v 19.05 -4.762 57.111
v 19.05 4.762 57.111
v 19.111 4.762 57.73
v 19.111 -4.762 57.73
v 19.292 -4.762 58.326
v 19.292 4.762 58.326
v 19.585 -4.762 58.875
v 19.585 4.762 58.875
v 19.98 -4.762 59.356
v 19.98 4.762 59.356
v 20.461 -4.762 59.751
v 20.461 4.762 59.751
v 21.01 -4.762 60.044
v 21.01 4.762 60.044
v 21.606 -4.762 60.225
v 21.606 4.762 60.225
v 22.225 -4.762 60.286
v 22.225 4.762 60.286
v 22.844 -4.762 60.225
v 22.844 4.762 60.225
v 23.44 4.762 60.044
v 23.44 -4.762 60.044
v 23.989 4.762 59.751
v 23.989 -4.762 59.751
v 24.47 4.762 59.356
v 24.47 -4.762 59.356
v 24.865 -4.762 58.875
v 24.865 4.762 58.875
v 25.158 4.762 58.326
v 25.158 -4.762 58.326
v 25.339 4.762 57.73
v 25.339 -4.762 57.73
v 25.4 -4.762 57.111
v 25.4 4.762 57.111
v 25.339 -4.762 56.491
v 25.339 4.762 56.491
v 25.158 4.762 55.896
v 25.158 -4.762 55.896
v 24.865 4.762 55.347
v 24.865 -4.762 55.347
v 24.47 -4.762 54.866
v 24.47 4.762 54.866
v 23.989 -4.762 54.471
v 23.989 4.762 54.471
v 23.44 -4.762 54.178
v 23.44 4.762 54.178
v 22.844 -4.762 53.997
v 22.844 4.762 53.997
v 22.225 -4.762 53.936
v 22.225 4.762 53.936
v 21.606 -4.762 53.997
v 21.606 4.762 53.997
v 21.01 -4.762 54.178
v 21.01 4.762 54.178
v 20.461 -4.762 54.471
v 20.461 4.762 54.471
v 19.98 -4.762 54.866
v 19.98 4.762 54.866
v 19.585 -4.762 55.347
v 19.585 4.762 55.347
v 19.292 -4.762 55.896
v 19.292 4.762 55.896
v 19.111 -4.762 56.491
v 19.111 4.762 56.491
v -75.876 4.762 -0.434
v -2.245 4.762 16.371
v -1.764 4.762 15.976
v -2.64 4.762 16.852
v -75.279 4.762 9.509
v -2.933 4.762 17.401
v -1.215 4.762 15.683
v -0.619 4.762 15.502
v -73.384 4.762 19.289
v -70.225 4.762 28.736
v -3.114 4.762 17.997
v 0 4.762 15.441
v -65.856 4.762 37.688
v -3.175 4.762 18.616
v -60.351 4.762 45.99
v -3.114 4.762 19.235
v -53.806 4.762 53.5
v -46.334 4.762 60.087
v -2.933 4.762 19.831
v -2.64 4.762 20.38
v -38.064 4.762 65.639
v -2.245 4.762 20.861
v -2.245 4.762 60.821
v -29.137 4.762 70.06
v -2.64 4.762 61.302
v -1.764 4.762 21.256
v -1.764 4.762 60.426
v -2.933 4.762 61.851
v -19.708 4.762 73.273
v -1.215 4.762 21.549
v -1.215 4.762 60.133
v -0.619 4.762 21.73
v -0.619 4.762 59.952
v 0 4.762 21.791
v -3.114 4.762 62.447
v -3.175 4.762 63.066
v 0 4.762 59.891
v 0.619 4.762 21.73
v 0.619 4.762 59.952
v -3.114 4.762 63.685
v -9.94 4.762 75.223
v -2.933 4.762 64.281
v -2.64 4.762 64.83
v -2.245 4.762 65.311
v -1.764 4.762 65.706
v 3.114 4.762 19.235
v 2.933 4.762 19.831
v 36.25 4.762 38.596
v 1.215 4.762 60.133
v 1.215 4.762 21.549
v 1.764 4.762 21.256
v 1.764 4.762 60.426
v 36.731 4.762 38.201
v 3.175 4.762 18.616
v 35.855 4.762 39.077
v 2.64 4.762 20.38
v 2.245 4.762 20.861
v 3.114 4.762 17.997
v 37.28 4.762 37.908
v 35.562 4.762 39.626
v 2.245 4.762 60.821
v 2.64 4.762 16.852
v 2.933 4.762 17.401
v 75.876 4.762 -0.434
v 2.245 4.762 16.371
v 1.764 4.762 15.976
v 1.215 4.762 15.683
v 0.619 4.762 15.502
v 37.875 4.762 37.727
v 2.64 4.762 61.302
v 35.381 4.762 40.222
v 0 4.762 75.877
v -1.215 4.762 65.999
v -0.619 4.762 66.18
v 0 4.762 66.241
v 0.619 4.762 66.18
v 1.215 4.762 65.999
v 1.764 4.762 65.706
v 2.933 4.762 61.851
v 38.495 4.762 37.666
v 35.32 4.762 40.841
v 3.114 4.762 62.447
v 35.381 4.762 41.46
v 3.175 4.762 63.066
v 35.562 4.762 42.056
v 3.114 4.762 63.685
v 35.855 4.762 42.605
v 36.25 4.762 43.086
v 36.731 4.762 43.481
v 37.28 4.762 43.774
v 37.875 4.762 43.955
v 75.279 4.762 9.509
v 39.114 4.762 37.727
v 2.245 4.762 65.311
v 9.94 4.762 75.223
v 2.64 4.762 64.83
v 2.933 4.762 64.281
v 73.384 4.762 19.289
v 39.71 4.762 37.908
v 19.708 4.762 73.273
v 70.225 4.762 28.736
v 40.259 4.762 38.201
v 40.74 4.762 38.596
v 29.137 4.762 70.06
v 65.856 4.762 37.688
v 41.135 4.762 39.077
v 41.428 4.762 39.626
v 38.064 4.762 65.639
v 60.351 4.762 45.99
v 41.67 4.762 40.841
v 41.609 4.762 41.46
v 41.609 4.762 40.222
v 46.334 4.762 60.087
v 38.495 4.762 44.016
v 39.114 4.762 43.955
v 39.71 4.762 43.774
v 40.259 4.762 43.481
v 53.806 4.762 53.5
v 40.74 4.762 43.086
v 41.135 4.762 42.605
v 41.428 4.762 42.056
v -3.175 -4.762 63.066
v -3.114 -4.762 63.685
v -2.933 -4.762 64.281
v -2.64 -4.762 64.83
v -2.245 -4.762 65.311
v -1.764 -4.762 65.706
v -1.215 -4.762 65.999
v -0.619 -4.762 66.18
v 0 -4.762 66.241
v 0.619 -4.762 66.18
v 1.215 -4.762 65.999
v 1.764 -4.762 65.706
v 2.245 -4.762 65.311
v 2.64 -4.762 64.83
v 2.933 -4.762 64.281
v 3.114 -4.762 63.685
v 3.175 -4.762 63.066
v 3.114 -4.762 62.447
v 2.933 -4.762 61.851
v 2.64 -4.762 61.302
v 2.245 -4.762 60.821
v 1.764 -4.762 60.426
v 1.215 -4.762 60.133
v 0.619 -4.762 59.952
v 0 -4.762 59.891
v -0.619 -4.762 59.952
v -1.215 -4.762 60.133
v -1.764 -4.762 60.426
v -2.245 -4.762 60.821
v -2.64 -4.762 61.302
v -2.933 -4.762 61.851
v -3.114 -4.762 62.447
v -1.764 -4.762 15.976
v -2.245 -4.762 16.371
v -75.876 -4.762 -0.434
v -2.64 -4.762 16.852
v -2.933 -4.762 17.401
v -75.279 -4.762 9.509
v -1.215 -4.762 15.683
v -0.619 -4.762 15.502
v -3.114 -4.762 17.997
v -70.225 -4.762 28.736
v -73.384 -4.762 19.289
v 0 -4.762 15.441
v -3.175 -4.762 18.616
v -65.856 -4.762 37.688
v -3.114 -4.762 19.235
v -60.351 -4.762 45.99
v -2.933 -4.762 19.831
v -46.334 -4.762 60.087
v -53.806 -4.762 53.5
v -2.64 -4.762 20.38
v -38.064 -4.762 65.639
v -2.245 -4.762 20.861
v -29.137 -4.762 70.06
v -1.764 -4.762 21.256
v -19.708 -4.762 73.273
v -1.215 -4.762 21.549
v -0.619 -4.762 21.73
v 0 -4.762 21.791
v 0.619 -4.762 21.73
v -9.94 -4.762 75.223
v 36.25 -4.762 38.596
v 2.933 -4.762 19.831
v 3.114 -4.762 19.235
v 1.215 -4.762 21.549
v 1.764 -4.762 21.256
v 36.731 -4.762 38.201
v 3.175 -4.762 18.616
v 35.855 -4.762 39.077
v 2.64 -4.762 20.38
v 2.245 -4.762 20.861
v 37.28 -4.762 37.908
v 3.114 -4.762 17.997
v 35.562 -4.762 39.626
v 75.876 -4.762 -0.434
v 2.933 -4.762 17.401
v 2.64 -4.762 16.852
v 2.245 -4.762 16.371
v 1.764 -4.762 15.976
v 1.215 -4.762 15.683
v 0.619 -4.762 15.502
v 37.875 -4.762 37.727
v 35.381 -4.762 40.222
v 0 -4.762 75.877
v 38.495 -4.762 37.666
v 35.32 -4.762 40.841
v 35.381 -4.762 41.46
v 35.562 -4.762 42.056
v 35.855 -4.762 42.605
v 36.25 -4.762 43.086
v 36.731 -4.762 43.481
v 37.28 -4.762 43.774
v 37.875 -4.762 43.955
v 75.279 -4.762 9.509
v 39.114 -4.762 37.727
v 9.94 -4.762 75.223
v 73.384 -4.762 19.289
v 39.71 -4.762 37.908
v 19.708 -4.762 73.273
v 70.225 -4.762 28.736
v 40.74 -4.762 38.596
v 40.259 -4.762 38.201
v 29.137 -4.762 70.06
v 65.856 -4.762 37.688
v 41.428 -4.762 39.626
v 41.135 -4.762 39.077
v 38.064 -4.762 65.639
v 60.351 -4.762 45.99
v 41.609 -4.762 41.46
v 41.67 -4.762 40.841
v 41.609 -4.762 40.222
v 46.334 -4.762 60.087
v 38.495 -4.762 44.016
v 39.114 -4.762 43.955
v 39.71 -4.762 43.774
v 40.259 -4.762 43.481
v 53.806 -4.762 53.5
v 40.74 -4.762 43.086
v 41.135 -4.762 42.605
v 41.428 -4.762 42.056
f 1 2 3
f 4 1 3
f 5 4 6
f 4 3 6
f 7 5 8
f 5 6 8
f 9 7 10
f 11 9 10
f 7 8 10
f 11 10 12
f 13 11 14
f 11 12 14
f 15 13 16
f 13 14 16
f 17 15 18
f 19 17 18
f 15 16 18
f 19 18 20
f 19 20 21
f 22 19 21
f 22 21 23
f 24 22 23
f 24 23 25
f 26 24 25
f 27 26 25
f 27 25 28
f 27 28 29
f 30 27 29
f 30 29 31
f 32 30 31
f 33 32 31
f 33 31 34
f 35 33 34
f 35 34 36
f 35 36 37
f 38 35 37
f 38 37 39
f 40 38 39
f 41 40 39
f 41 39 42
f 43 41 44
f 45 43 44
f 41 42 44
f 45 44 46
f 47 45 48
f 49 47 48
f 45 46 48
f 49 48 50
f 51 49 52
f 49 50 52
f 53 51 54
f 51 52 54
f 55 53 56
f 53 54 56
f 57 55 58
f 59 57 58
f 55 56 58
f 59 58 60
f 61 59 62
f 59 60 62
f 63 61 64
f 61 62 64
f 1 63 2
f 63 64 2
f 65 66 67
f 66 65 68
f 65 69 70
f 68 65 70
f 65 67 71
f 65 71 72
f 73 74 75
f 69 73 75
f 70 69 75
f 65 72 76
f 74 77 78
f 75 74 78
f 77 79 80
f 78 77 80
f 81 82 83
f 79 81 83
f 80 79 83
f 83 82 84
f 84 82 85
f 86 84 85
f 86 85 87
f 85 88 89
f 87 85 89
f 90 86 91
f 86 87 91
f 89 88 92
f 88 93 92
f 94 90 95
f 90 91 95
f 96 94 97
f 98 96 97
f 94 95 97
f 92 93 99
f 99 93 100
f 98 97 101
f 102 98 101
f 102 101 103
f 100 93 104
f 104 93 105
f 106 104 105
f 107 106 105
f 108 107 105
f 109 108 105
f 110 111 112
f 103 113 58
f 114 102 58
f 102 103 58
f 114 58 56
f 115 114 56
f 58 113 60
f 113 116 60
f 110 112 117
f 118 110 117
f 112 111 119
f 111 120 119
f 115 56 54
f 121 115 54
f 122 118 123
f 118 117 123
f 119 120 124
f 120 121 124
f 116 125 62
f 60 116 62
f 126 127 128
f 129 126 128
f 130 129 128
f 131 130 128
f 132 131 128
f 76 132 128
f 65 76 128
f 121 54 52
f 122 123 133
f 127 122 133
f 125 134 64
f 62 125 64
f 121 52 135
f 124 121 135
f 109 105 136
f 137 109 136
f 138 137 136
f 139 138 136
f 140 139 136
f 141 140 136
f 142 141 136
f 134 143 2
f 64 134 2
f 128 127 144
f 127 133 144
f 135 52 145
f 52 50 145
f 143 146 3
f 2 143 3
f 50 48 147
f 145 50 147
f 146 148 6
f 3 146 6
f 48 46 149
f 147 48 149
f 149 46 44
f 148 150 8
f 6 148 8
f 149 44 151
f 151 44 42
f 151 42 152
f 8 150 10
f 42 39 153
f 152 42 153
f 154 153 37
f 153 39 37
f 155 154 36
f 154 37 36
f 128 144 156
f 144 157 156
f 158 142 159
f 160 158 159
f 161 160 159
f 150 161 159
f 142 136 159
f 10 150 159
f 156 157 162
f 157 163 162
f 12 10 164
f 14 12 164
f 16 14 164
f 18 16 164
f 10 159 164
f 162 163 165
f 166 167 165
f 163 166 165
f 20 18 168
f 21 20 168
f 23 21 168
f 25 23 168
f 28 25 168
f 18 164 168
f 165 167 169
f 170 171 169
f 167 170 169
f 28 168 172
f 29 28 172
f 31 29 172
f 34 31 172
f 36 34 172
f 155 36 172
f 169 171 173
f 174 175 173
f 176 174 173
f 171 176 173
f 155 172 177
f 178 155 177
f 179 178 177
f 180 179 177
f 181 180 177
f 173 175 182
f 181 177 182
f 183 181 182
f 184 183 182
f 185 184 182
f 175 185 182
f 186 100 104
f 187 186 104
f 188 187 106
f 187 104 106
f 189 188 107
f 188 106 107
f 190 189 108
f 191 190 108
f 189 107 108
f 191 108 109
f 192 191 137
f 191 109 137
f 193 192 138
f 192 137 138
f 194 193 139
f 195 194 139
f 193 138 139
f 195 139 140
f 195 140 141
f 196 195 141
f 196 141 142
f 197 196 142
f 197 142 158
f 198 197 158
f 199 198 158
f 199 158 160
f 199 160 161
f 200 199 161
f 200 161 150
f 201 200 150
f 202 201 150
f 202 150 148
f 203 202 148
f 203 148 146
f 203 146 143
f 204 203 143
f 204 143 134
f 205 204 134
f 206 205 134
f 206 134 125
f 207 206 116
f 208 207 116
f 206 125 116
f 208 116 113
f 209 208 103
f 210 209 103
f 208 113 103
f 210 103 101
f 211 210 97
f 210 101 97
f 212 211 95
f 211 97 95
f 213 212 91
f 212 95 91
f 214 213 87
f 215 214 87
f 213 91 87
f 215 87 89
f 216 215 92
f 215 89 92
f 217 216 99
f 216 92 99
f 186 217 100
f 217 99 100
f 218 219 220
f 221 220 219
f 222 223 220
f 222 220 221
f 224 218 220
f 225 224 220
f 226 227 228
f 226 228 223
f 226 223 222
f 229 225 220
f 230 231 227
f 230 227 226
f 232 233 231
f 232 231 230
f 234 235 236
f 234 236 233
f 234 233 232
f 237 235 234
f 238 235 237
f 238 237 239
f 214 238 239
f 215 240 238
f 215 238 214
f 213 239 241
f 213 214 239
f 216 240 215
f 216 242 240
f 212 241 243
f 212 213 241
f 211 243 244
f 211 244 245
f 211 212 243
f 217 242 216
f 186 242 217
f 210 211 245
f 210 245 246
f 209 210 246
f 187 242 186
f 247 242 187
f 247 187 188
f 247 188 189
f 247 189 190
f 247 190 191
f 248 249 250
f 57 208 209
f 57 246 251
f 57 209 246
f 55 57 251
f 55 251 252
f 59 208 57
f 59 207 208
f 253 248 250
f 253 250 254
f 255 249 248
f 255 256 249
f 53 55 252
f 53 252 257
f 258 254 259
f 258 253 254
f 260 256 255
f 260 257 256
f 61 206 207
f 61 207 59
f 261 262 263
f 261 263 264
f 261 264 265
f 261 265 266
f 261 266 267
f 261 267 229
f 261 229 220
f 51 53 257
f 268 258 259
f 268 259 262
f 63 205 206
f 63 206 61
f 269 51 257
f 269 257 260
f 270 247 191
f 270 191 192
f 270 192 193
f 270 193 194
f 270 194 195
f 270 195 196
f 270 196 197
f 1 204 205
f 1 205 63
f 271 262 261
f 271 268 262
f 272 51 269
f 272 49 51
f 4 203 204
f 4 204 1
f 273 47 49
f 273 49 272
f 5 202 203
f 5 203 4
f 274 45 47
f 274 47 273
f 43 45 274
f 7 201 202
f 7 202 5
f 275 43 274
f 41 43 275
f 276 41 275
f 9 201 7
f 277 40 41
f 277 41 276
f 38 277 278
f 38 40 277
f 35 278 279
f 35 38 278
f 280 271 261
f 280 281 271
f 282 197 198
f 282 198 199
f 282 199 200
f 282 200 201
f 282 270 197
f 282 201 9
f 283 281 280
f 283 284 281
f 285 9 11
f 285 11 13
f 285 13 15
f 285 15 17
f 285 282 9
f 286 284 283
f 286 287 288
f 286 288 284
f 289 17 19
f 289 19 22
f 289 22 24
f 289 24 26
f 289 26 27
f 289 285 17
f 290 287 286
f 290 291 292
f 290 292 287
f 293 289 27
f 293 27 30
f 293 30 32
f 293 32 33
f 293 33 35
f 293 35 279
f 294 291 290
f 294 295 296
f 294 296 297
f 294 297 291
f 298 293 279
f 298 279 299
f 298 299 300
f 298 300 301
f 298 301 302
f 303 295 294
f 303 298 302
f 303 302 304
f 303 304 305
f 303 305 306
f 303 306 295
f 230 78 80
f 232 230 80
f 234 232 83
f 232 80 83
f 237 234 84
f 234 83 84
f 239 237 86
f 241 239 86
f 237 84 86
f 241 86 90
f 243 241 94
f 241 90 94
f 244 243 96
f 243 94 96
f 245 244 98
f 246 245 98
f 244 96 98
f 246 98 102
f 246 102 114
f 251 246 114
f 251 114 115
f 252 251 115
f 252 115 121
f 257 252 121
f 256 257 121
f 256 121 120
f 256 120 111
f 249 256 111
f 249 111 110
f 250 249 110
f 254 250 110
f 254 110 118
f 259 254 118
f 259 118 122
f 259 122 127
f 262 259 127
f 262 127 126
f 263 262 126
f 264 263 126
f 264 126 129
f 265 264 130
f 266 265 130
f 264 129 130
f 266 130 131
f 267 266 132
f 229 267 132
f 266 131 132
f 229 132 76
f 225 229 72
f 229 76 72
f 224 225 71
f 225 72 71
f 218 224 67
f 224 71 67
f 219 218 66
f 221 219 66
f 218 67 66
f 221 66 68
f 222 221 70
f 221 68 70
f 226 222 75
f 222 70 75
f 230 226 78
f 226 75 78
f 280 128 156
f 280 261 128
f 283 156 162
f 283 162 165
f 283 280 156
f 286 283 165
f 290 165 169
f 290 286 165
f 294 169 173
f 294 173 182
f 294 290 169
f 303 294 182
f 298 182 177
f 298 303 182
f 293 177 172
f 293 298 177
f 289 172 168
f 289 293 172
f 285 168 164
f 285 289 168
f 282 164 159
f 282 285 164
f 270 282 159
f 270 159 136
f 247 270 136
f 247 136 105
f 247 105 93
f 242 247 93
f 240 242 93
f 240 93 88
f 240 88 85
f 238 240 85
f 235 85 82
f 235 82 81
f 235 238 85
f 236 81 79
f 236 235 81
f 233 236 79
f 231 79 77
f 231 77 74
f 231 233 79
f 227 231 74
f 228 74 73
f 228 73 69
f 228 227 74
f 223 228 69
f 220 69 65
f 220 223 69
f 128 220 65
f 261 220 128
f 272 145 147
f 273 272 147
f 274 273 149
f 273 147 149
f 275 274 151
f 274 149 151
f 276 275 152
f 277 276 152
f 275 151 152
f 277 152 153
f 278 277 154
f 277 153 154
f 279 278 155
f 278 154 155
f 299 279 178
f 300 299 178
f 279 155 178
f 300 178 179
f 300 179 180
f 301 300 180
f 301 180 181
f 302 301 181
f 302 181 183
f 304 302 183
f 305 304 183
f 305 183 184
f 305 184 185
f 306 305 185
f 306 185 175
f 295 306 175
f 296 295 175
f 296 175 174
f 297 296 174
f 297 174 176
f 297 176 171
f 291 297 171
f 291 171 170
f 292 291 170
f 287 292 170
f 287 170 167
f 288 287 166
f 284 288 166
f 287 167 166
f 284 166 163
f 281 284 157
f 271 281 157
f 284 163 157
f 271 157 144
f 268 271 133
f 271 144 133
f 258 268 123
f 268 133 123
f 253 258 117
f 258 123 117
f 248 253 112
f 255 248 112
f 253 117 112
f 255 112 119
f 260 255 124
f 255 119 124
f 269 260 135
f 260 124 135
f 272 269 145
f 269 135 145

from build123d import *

# Parameters (mm, degrees)
F1_DEPTH = 4.7625
F3_D     = 6.35


with BuildPart() as f1:
    # F0 (on Front) → F1 (new body, symmetric)
    with BuildSketch(Plane.XZ):
        with BuildLine():
            ThreePointArc((75.875851, -0.433923), (0, 75.877092), (-75.875851, -0.433923))
            Line((-75.875851, -0.433923), (75.875851, -0.433923))
        make_face()
    extrude(amount=F1_DEPTH, both=True)

    # F3 (through all)
    with Locations(Plane.XZ.offset(4.7625)):
        with Locations((0, 18.616077), (38.494829, 40.841077), (22.225, 57.110906), (0, 63.066077)):
            Hole(F3_D / 2)


solid = f1.part
